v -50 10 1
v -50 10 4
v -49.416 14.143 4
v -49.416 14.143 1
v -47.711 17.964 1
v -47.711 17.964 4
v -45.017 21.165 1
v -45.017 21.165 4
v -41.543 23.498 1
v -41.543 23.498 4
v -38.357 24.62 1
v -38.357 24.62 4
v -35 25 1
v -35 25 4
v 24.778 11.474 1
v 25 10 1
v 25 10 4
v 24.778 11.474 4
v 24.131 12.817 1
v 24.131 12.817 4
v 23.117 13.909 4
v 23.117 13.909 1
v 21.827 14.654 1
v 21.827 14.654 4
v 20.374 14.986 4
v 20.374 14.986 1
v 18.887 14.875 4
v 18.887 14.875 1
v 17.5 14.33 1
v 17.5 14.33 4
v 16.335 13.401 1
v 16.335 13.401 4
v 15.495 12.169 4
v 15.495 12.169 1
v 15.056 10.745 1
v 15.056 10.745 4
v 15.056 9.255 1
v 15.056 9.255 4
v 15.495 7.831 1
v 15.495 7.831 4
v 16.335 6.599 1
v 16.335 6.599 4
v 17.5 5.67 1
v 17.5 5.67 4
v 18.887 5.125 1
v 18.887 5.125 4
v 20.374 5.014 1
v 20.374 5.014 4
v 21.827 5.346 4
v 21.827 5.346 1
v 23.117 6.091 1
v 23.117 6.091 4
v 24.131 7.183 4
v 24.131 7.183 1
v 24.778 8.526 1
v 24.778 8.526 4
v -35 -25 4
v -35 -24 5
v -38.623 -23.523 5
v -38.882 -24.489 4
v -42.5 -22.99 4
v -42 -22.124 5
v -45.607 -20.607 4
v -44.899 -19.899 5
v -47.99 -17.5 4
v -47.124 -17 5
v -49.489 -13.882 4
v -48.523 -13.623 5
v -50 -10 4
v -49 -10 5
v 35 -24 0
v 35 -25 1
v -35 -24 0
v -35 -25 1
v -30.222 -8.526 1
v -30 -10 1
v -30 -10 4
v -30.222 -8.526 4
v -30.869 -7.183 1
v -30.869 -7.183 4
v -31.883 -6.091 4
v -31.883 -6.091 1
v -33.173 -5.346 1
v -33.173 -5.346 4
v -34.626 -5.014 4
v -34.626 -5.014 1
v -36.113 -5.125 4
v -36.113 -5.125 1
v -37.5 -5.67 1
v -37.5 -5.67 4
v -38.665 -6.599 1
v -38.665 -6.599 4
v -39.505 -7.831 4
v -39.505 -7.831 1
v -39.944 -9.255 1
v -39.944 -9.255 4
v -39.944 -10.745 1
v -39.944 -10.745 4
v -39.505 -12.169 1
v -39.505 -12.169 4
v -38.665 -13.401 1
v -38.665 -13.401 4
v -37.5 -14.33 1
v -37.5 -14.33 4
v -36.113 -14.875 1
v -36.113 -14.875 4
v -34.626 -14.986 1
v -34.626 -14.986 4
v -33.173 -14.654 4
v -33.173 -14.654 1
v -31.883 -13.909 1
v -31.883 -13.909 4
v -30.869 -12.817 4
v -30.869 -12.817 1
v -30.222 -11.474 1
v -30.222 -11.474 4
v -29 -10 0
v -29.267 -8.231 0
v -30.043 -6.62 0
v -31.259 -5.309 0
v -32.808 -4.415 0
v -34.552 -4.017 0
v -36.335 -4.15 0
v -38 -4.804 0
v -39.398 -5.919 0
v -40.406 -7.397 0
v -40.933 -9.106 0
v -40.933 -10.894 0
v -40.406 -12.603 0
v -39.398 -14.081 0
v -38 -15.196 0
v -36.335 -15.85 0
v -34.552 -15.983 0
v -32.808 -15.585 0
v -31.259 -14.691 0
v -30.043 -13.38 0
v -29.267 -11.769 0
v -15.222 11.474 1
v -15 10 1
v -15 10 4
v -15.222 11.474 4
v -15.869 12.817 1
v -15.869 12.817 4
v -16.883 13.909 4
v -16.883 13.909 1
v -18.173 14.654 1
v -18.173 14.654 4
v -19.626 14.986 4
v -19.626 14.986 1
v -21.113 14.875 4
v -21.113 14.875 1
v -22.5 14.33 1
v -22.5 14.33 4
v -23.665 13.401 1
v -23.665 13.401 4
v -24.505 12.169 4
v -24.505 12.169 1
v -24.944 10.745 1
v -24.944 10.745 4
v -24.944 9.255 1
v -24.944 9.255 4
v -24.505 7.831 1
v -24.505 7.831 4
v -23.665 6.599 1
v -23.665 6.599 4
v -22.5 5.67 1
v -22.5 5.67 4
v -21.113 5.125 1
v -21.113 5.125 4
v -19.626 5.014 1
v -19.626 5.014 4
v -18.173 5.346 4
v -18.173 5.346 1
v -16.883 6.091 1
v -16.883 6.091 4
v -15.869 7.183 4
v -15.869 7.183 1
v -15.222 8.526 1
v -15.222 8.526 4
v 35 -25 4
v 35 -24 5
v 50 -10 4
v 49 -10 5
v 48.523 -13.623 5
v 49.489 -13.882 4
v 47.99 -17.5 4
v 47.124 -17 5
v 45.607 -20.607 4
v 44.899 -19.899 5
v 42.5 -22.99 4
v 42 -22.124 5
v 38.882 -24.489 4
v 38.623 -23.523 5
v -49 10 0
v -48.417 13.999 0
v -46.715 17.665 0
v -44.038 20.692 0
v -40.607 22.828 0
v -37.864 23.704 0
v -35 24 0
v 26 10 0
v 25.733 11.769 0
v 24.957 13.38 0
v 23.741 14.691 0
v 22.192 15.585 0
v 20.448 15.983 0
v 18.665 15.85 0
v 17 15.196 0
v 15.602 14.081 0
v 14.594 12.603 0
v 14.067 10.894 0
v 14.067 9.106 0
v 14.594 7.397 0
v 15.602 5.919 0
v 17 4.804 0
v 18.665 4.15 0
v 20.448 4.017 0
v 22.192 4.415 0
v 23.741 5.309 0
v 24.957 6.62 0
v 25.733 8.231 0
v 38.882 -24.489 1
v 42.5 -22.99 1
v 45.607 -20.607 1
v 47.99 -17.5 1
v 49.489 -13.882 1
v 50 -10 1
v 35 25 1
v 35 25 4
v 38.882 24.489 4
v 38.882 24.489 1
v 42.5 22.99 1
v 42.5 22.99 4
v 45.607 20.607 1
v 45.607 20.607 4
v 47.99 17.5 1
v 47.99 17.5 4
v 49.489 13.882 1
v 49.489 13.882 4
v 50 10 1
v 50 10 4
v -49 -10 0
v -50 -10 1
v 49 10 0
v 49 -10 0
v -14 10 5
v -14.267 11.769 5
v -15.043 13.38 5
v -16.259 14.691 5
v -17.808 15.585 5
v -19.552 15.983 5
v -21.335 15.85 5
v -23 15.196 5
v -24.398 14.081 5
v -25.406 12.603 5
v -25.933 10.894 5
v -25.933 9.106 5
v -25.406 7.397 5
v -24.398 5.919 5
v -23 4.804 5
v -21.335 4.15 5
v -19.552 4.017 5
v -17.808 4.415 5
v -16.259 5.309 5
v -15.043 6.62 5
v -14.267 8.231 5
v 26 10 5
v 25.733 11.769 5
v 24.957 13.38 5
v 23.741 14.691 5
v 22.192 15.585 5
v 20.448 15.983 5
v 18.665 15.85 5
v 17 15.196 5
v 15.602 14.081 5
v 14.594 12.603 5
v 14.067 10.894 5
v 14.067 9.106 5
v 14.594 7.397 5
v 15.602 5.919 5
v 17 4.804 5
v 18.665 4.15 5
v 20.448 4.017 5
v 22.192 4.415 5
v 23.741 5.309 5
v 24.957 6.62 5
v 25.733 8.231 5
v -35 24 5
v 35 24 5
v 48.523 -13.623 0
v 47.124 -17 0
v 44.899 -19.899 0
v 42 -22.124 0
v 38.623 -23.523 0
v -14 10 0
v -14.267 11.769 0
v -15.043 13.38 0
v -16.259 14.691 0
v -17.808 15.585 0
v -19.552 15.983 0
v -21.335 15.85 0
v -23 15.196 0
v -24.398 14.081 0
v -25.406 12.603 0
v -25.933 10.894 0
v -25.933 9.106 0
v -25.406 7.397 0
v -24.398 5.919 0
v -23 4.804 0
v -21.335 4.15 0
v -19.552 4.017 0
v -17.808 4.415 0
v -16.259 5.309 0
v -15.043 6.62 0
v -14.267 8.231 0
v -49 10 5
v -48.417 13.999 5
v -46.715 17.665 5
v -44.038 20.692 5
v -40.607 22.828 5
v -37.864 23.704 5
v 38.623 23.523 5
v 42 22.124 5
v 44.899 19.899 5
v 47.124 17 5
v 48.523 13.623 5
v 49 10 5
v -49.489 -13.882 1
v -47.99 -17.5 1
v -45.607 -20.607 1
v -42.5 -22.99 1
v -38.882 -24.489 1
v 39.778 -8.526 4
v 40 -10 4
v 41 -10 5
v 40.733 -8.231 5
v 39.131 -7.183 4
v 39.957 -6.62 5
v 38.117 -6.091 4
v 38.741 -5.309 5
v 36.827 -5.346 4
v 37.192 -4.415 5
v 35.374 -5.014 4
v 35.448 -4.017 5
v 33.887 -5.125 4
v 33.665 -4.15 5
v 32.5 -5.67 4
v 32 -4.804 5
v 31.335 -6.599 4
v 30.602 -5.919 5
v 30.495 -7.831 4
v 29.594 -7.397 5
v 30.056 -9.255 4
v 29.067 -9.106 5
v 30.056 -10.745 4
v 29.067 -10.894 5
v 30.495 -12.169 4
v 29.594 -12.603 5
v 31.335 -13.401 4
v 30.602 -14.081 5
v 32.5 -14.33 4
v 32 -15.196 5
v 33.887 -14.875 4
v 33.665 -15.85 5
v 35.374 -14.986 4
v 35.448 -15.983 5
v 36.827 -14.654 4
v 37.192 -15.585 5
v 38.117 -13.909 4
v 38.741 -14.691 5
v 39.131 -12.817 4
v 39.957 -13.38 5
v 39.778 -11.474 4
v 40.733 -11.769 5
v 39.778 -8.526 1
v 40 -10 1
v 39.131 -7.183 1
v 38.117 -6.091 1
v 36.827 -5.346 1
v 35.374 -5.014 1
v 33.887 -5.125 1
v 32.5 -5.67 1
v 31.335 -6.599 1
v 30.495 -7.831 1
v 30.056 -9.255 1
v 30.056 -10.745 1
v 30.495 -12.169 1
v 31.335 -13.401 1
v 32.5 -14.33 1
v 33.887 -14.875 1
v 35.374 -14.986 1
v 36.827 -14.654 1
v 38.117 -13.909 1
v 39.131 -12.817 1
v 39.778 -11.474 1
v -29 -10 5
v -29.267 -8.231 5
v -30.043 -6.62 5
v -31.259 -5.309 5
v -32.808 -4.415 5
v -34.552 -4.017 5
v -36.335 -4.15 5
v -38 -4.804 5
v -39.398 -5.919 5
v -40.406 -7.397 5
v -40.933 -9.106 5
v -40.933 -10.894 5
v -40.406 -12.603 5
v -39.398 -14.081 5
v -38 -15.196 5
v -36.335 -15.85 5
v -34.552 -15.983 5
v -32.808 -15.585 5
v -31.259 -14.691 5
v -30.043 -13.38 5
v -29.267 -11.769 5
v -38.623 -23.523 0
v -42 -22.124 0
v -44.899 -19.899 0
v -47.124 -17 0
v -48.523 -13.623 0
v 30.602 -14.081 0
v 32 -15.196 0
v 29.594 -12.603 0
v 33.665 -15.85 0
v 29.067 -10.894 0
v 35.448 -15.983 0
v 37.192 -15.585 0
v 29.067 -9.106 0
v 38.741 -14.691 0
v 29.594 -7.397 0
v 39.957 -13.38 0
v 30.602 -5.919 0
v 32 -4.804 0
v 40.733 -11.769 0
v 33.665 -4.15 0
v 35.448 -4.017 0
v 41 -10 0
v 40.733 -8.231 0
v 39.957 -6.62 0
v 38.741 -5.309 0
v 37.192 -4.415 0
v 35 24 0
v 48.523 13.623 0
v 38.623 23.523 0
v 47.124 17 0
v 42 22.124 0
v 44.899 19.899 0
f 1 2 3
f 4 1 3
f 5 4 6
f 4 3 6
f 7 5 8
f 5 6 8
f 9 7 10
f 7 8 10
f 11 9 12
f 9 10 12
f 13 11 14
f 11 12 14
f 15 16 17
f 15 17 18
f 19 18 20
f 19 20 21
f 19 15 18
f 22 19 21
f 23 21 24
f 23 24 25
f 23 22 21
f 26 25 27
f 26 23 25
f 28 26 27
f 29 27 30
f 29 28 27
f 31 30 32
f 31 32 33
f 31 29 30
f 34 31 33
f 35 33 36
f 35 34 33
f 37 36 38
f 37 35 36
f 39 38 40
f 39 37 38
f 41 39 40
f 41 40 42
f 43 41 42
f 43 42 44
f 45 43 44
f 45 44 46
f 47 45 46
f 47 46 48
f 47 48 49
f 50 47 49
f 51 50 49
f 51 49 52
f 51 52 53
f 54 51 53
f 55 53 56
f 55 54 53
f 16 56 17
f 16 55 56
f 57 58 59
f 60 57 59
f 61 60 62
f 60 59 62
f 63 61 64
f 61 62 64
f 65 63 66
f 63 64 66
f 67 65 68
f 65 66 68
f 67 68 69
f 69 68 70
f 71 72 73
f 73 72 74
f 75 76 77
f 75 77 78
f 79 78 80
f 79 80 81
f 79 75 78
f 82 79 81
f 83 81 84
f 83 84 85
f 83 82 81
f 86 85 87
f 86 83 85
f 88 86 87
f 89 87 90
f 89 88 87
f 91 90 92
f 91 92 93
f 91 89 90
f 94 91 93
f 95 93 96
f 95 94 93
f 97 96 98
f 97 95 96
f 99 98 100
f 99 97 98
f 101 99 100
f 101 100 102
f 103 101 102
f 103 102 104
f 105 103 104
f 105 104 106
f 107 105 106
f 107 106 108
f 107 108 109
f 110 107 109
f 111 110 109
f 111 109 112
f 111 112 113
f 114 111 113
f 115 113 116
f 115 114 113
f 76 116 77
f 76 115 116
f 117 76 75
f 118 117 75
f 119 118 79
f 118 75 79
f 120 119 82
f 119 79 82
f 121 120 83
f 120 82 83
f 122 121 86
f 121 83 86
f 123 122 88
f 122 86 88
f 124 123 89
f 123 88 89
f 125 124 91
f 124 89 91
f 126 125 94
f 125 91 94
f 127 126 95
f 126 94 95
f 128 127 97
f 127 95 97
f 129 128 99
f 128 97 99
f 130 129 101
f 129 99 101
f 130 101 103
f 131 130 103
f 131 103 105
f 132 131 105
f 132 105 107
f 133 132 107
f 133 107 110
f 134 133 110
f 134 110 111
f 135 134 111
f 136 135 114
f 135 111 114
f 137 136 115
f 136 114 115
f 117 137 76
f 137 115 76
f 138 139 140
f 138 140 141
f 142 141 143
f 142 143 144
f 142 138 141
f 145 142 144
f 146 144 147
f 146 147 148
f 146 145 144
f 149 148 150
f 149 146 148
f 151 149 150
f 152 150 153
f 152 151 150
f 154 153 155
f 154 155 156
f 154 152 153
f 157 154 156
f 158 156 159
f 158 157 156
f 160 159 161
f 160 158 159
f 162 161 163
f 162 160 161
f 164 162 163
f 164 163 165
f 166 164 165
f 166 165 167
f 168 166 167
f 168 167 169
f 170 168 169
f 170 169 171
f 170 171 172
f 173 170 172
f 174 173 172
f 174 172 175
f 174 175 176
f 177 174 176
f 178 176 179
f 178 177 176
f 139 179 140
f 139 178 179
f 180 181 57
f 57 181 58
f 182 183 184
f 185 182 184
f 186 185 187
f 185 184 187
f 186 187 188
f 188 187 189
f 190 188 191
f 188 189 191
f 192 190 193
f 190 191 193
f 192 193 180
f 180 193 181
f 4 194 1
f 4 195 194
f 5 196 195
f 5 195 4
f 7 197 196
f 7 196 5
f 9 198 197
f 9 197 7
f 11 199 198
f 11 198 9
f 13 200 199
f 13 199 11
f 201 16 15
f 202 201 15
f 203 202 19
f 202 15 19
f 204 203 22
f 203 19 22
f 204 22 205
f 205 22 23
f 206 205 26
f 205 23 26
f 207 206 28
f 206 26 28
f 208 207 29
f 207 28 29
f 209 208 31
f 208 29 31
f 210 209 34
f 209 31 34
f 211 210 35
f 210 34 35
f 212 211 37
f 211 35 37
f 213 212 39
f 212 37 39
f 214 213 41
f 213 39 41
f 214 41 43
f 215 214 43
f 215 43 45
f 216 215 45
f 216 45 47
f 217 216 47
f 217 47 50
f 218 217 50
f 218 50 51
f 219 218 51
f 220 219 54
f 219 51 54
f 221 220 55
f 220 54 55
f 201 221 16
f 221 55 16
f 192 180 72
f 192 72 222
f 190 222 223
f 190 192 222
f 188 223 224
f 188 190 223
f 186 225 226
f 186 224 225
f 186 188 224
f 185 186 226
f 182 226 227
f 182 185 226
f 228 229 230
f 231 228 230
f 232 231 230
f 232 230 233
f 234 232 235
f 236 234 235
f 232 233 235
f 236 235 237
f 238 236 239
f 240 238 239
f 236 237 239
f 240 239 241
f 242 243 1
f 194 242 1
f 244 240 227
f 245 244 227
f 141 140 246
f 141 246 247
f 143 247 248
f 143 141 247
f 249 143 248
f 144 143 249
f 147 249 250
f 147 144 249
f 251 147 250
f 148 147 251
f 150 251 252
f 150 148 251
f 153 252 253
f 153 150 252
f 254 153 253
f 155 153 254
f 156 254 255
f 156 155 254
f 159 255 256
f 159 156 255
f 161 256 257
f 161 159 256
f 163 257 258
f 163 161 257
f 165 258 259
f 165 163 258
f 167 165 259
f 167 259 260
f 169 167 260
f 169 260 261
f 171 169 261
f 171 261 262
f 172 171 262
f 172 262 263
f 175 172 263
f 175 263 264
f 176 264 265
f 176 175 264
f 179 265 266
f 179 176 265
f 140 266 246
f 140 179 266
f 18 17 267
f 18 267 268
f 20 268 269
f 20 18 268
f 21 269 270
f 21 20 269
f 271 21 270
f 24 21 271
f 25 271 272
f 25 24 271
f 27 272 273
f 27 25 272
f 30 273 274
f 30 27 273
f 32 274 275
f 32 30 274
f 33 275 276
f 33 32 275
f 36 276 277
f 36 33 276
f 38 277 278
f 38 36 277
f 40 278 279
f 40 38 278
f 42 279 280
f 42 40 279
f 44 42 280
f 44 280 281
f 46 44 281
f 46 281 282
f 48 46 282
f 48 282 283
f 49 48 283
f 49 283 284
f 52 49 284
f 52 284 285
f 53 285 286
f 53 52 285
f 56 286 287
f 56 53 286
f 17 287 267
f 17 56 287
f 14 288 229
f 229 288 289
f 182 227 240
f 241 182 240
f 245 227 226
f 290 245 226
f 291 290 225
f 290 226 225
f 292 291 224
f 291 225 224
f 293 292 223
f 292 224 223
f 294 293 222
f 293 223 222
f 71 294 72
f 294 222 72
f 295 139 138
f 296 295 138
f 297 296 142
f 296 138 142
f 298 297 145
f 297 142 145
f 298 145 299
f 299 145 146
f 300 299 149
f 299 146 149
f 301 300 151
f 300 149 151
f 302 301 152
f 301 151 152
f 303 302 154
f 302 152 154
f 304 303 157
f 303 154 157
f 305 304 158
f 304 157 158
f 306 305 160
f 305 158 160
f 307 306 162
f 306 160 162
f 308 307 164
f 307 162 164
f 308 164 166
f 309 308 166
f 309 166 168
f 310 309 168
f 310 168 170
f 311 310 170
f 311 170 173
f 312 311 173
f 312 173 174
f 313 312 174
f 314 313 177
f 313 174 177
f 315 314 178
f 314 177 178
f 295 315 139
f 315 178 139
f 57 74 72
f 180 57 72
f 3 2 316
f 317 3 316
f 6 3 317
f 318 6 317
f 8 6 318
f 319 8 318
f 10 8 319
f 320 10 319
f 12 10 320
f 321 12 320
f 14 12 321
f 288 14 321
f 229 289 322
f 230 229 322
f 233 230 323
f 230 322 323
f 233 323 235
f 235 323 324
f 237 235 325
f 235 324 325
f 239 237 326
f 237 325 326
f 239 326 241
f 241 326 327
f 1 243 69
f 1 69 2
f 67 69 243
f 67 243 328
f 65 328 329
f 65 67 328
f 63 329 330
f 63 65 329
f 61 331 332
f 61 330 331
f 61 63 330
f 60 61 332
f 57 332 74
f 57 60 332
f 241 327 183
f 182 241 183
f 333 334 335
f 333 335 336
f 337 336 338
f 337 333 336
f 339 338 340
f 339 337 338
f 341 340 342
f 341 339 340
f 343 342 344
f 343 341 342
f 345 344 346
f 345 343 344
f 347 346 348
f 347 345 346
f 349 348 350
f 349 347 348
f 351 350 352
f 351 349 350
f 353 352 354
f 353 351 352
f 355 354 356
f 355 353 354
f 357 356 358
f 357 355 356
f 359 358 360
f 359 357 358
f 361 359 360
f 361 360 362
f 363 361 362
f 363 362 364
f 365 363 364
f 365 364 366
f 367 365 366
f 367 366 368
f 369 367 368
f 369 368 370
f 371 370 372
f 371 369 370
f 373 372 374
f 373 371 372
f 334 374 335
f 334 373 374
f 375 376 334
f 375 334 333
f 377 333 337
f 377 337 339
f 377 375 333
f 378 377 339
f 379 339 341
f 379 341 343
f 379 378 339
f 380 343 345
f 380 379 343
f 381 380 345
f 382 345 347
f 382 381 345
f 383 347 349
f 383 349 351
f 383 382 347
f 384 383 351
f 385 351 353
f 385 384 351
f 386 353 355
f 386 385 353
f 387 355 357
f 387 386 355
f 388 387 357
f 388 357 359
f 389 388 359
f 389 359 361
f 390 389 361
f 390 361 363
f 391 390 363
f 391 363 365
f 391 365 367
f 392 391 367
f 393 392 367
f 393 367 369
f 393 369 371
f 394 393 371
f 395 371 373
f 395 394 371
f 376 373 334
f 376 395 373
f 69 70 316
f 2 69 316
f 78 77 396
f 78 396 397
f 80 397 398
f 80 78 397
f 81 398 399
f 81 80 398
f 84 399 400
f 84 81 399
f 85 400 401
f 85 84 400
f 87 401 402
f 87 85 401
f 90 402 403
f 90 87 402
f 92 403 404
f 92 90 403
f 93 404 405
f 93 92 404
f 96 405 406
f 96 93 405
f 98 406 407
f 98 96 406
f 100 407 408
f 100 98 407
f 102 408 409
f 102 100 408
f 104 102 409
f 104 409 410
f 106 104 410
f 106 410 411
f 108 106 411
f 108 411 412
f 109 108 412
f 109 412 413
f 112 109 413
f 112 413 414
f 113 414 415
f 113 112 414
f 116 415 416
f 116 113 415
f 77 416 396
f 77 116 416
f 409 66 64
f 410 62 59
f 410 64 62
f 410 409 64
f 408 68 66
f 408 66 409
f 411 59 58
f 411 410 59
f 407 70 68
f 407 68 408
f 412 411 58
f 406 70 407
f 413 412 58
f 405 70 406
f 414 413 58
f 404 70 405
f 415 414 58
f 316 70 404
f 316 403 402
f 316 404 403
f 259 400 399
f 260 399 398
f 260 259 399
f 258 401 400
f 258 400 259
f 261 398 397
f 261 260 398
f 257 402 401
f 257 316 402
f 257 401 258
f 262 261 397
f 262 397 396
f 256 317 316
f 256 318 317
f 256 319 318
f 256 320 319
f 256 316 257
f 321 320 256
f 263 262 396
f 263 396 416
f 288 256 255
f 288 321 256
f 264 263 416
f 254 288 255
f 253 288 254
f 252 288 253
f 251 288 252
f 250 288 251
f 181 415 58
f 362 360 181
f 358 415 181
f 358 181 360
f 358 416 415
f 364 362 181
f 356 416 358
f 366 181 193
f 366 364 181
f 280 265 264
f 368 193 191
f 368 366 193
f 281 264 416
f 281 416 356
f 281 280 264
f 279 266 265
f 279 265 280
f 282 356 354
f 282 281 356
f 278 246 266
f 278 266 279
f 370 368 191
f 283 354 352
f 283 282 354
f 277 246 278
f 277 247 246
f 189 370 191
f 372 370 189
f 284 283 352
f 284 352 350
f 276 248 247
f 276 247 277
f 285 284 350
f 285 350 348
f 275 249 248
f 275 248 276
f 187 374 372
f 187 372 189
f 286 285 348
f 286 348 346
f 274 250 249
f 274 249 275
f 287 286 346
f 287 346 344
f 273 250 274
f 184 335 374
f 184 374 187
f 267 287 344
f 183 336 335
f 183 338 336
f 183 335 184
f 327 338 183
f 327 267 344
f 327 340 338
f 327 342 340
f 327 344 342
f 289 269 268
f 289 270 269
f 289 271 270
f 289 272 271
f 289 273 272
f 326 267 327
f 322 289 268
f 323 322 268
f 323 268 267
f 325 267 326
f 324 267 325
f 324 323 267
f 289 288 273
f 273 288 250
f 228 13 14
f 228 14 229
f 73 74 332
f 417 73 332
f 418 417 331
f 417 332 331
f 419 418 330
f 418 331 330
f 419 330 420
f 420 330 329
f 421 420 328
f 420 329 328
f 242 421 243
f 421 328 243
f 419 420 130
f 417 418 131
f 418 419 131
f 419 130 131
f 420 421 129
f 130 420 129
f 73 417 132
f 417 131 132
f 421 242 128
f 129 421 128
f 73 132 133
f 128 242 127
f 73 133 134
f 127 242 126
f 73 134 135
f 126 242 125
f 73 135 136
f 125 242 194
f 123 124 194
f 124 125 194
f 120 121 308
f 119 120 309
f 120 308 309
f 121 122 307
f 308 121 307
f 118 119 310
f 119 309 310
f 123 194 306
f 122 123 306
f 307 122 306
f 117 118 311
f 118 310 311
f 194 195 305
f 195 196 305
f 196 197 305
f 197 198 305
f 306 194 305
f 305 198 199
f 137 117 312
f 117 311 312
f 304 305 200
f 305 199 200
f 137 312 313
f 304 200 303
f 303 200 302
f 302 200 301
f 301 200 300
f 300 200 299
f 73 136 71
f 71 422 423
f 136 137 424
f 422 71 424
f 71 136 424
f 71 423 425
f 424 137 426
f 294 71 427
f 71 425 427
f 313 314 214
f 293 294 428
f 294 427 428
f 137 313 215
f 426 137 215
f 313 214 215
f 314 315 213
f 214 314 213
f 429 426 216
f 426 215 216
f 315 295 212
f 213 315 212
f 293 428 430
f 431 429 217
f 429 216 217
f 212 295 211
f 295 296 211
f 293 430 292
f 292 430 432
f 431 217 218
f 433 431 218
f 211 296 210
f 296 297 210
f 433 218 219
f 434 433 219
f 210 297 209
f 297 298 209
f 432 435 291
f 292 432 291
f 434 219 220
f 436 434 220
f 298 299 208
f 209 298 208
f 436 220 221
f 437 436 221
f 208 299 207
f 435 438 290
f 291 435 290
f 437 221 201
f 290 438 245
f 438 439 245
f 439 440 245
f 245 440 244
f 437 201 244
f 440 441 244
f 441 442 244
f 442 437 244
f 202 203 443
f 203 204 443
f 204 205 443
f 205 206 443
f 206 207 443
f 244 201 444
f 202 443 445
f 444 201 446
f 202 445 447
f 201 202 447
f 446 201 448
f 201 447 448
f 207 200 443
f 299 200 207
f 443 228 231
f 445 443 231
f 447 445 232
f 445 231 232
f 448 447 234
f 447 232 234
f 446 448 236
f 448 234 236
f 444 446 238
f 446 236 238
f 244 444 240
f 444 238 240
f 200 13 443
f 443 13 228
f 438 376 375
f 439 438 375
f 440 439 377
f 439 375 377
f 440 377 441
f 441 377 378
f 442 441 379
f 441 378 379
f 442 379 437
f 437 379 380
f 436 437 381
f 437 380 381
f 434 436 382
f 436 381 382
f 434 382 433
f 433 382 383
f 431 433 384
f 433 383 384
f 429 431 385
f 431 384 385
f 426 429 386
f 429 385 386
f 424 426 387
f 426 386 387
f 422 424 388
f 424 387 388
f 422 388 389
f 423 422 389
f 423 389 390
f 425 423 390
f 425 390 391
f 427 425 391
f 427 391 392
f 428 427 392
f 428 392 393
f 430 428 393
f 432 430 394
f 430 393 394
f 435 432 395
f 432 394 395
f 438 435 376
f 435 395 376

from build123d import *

# Parameters (mm, degrees)
F0_W     = 100
F0_H     = 50
F0_R     = 5
F1_DEPTH = 5
F2_R     = 15
F3_SIZE  = 1
F4_SIZE  = 1


with BuildPart() as f1:
    # F0 (on Top) → F1 (new body)
    with BuildSketch(Plane.XY):
        Rectangle(F0_W, F0_H)
        with Locations((-35, -10)):
            Circle(F0_R, mode=Mode.SUBTRACT)
        with Locations((35, -10)):
            Circle(F0_R, mode=Mode.SUBTRACT)
        with Locations((-20, 10)):
            Circle(F0_R, mode=Mode.SUBTRACT)
        with Locations((20, 10)):
            Circle(F0_R, mode=Mode.SUBTRACT)
    extrude(amount=F1_DEPTH)

    # F2
    f2_edges = [f1.edges().sort_by_distance(p)[0] for p in [
        (-50, 25, 2.5),
        (-50, -25, 2.5),
        (50, -25, 2.5),
        (50, 25, 2.5),
    ]]
    fillet(f2_edges, radius=F2_R)

    # F3
    f3_edges = [f1.edges().sort_by_distance(p)[0] for p in [
        (-25, 10, 5),
        (-40, -10, 5),
        (-25, 10, 0),
        (-40, -10, 0),
        (15, 10, 5),
        (15, 10, 0),
        (30, -10, 5),
        (30, -10, 0),
    ]]
    chamfer(f3_edges, length=F3_SIZE)

    # F4
    f4_edges = [f1.edges().sort_by_distance(p)[0] for p in [
        (-45.606602, 20.606602, 5),
        (-50, 0, 0),
    ]]
    chamfer(f4_edges, length=F4_SIZE)


solid = f1.part
